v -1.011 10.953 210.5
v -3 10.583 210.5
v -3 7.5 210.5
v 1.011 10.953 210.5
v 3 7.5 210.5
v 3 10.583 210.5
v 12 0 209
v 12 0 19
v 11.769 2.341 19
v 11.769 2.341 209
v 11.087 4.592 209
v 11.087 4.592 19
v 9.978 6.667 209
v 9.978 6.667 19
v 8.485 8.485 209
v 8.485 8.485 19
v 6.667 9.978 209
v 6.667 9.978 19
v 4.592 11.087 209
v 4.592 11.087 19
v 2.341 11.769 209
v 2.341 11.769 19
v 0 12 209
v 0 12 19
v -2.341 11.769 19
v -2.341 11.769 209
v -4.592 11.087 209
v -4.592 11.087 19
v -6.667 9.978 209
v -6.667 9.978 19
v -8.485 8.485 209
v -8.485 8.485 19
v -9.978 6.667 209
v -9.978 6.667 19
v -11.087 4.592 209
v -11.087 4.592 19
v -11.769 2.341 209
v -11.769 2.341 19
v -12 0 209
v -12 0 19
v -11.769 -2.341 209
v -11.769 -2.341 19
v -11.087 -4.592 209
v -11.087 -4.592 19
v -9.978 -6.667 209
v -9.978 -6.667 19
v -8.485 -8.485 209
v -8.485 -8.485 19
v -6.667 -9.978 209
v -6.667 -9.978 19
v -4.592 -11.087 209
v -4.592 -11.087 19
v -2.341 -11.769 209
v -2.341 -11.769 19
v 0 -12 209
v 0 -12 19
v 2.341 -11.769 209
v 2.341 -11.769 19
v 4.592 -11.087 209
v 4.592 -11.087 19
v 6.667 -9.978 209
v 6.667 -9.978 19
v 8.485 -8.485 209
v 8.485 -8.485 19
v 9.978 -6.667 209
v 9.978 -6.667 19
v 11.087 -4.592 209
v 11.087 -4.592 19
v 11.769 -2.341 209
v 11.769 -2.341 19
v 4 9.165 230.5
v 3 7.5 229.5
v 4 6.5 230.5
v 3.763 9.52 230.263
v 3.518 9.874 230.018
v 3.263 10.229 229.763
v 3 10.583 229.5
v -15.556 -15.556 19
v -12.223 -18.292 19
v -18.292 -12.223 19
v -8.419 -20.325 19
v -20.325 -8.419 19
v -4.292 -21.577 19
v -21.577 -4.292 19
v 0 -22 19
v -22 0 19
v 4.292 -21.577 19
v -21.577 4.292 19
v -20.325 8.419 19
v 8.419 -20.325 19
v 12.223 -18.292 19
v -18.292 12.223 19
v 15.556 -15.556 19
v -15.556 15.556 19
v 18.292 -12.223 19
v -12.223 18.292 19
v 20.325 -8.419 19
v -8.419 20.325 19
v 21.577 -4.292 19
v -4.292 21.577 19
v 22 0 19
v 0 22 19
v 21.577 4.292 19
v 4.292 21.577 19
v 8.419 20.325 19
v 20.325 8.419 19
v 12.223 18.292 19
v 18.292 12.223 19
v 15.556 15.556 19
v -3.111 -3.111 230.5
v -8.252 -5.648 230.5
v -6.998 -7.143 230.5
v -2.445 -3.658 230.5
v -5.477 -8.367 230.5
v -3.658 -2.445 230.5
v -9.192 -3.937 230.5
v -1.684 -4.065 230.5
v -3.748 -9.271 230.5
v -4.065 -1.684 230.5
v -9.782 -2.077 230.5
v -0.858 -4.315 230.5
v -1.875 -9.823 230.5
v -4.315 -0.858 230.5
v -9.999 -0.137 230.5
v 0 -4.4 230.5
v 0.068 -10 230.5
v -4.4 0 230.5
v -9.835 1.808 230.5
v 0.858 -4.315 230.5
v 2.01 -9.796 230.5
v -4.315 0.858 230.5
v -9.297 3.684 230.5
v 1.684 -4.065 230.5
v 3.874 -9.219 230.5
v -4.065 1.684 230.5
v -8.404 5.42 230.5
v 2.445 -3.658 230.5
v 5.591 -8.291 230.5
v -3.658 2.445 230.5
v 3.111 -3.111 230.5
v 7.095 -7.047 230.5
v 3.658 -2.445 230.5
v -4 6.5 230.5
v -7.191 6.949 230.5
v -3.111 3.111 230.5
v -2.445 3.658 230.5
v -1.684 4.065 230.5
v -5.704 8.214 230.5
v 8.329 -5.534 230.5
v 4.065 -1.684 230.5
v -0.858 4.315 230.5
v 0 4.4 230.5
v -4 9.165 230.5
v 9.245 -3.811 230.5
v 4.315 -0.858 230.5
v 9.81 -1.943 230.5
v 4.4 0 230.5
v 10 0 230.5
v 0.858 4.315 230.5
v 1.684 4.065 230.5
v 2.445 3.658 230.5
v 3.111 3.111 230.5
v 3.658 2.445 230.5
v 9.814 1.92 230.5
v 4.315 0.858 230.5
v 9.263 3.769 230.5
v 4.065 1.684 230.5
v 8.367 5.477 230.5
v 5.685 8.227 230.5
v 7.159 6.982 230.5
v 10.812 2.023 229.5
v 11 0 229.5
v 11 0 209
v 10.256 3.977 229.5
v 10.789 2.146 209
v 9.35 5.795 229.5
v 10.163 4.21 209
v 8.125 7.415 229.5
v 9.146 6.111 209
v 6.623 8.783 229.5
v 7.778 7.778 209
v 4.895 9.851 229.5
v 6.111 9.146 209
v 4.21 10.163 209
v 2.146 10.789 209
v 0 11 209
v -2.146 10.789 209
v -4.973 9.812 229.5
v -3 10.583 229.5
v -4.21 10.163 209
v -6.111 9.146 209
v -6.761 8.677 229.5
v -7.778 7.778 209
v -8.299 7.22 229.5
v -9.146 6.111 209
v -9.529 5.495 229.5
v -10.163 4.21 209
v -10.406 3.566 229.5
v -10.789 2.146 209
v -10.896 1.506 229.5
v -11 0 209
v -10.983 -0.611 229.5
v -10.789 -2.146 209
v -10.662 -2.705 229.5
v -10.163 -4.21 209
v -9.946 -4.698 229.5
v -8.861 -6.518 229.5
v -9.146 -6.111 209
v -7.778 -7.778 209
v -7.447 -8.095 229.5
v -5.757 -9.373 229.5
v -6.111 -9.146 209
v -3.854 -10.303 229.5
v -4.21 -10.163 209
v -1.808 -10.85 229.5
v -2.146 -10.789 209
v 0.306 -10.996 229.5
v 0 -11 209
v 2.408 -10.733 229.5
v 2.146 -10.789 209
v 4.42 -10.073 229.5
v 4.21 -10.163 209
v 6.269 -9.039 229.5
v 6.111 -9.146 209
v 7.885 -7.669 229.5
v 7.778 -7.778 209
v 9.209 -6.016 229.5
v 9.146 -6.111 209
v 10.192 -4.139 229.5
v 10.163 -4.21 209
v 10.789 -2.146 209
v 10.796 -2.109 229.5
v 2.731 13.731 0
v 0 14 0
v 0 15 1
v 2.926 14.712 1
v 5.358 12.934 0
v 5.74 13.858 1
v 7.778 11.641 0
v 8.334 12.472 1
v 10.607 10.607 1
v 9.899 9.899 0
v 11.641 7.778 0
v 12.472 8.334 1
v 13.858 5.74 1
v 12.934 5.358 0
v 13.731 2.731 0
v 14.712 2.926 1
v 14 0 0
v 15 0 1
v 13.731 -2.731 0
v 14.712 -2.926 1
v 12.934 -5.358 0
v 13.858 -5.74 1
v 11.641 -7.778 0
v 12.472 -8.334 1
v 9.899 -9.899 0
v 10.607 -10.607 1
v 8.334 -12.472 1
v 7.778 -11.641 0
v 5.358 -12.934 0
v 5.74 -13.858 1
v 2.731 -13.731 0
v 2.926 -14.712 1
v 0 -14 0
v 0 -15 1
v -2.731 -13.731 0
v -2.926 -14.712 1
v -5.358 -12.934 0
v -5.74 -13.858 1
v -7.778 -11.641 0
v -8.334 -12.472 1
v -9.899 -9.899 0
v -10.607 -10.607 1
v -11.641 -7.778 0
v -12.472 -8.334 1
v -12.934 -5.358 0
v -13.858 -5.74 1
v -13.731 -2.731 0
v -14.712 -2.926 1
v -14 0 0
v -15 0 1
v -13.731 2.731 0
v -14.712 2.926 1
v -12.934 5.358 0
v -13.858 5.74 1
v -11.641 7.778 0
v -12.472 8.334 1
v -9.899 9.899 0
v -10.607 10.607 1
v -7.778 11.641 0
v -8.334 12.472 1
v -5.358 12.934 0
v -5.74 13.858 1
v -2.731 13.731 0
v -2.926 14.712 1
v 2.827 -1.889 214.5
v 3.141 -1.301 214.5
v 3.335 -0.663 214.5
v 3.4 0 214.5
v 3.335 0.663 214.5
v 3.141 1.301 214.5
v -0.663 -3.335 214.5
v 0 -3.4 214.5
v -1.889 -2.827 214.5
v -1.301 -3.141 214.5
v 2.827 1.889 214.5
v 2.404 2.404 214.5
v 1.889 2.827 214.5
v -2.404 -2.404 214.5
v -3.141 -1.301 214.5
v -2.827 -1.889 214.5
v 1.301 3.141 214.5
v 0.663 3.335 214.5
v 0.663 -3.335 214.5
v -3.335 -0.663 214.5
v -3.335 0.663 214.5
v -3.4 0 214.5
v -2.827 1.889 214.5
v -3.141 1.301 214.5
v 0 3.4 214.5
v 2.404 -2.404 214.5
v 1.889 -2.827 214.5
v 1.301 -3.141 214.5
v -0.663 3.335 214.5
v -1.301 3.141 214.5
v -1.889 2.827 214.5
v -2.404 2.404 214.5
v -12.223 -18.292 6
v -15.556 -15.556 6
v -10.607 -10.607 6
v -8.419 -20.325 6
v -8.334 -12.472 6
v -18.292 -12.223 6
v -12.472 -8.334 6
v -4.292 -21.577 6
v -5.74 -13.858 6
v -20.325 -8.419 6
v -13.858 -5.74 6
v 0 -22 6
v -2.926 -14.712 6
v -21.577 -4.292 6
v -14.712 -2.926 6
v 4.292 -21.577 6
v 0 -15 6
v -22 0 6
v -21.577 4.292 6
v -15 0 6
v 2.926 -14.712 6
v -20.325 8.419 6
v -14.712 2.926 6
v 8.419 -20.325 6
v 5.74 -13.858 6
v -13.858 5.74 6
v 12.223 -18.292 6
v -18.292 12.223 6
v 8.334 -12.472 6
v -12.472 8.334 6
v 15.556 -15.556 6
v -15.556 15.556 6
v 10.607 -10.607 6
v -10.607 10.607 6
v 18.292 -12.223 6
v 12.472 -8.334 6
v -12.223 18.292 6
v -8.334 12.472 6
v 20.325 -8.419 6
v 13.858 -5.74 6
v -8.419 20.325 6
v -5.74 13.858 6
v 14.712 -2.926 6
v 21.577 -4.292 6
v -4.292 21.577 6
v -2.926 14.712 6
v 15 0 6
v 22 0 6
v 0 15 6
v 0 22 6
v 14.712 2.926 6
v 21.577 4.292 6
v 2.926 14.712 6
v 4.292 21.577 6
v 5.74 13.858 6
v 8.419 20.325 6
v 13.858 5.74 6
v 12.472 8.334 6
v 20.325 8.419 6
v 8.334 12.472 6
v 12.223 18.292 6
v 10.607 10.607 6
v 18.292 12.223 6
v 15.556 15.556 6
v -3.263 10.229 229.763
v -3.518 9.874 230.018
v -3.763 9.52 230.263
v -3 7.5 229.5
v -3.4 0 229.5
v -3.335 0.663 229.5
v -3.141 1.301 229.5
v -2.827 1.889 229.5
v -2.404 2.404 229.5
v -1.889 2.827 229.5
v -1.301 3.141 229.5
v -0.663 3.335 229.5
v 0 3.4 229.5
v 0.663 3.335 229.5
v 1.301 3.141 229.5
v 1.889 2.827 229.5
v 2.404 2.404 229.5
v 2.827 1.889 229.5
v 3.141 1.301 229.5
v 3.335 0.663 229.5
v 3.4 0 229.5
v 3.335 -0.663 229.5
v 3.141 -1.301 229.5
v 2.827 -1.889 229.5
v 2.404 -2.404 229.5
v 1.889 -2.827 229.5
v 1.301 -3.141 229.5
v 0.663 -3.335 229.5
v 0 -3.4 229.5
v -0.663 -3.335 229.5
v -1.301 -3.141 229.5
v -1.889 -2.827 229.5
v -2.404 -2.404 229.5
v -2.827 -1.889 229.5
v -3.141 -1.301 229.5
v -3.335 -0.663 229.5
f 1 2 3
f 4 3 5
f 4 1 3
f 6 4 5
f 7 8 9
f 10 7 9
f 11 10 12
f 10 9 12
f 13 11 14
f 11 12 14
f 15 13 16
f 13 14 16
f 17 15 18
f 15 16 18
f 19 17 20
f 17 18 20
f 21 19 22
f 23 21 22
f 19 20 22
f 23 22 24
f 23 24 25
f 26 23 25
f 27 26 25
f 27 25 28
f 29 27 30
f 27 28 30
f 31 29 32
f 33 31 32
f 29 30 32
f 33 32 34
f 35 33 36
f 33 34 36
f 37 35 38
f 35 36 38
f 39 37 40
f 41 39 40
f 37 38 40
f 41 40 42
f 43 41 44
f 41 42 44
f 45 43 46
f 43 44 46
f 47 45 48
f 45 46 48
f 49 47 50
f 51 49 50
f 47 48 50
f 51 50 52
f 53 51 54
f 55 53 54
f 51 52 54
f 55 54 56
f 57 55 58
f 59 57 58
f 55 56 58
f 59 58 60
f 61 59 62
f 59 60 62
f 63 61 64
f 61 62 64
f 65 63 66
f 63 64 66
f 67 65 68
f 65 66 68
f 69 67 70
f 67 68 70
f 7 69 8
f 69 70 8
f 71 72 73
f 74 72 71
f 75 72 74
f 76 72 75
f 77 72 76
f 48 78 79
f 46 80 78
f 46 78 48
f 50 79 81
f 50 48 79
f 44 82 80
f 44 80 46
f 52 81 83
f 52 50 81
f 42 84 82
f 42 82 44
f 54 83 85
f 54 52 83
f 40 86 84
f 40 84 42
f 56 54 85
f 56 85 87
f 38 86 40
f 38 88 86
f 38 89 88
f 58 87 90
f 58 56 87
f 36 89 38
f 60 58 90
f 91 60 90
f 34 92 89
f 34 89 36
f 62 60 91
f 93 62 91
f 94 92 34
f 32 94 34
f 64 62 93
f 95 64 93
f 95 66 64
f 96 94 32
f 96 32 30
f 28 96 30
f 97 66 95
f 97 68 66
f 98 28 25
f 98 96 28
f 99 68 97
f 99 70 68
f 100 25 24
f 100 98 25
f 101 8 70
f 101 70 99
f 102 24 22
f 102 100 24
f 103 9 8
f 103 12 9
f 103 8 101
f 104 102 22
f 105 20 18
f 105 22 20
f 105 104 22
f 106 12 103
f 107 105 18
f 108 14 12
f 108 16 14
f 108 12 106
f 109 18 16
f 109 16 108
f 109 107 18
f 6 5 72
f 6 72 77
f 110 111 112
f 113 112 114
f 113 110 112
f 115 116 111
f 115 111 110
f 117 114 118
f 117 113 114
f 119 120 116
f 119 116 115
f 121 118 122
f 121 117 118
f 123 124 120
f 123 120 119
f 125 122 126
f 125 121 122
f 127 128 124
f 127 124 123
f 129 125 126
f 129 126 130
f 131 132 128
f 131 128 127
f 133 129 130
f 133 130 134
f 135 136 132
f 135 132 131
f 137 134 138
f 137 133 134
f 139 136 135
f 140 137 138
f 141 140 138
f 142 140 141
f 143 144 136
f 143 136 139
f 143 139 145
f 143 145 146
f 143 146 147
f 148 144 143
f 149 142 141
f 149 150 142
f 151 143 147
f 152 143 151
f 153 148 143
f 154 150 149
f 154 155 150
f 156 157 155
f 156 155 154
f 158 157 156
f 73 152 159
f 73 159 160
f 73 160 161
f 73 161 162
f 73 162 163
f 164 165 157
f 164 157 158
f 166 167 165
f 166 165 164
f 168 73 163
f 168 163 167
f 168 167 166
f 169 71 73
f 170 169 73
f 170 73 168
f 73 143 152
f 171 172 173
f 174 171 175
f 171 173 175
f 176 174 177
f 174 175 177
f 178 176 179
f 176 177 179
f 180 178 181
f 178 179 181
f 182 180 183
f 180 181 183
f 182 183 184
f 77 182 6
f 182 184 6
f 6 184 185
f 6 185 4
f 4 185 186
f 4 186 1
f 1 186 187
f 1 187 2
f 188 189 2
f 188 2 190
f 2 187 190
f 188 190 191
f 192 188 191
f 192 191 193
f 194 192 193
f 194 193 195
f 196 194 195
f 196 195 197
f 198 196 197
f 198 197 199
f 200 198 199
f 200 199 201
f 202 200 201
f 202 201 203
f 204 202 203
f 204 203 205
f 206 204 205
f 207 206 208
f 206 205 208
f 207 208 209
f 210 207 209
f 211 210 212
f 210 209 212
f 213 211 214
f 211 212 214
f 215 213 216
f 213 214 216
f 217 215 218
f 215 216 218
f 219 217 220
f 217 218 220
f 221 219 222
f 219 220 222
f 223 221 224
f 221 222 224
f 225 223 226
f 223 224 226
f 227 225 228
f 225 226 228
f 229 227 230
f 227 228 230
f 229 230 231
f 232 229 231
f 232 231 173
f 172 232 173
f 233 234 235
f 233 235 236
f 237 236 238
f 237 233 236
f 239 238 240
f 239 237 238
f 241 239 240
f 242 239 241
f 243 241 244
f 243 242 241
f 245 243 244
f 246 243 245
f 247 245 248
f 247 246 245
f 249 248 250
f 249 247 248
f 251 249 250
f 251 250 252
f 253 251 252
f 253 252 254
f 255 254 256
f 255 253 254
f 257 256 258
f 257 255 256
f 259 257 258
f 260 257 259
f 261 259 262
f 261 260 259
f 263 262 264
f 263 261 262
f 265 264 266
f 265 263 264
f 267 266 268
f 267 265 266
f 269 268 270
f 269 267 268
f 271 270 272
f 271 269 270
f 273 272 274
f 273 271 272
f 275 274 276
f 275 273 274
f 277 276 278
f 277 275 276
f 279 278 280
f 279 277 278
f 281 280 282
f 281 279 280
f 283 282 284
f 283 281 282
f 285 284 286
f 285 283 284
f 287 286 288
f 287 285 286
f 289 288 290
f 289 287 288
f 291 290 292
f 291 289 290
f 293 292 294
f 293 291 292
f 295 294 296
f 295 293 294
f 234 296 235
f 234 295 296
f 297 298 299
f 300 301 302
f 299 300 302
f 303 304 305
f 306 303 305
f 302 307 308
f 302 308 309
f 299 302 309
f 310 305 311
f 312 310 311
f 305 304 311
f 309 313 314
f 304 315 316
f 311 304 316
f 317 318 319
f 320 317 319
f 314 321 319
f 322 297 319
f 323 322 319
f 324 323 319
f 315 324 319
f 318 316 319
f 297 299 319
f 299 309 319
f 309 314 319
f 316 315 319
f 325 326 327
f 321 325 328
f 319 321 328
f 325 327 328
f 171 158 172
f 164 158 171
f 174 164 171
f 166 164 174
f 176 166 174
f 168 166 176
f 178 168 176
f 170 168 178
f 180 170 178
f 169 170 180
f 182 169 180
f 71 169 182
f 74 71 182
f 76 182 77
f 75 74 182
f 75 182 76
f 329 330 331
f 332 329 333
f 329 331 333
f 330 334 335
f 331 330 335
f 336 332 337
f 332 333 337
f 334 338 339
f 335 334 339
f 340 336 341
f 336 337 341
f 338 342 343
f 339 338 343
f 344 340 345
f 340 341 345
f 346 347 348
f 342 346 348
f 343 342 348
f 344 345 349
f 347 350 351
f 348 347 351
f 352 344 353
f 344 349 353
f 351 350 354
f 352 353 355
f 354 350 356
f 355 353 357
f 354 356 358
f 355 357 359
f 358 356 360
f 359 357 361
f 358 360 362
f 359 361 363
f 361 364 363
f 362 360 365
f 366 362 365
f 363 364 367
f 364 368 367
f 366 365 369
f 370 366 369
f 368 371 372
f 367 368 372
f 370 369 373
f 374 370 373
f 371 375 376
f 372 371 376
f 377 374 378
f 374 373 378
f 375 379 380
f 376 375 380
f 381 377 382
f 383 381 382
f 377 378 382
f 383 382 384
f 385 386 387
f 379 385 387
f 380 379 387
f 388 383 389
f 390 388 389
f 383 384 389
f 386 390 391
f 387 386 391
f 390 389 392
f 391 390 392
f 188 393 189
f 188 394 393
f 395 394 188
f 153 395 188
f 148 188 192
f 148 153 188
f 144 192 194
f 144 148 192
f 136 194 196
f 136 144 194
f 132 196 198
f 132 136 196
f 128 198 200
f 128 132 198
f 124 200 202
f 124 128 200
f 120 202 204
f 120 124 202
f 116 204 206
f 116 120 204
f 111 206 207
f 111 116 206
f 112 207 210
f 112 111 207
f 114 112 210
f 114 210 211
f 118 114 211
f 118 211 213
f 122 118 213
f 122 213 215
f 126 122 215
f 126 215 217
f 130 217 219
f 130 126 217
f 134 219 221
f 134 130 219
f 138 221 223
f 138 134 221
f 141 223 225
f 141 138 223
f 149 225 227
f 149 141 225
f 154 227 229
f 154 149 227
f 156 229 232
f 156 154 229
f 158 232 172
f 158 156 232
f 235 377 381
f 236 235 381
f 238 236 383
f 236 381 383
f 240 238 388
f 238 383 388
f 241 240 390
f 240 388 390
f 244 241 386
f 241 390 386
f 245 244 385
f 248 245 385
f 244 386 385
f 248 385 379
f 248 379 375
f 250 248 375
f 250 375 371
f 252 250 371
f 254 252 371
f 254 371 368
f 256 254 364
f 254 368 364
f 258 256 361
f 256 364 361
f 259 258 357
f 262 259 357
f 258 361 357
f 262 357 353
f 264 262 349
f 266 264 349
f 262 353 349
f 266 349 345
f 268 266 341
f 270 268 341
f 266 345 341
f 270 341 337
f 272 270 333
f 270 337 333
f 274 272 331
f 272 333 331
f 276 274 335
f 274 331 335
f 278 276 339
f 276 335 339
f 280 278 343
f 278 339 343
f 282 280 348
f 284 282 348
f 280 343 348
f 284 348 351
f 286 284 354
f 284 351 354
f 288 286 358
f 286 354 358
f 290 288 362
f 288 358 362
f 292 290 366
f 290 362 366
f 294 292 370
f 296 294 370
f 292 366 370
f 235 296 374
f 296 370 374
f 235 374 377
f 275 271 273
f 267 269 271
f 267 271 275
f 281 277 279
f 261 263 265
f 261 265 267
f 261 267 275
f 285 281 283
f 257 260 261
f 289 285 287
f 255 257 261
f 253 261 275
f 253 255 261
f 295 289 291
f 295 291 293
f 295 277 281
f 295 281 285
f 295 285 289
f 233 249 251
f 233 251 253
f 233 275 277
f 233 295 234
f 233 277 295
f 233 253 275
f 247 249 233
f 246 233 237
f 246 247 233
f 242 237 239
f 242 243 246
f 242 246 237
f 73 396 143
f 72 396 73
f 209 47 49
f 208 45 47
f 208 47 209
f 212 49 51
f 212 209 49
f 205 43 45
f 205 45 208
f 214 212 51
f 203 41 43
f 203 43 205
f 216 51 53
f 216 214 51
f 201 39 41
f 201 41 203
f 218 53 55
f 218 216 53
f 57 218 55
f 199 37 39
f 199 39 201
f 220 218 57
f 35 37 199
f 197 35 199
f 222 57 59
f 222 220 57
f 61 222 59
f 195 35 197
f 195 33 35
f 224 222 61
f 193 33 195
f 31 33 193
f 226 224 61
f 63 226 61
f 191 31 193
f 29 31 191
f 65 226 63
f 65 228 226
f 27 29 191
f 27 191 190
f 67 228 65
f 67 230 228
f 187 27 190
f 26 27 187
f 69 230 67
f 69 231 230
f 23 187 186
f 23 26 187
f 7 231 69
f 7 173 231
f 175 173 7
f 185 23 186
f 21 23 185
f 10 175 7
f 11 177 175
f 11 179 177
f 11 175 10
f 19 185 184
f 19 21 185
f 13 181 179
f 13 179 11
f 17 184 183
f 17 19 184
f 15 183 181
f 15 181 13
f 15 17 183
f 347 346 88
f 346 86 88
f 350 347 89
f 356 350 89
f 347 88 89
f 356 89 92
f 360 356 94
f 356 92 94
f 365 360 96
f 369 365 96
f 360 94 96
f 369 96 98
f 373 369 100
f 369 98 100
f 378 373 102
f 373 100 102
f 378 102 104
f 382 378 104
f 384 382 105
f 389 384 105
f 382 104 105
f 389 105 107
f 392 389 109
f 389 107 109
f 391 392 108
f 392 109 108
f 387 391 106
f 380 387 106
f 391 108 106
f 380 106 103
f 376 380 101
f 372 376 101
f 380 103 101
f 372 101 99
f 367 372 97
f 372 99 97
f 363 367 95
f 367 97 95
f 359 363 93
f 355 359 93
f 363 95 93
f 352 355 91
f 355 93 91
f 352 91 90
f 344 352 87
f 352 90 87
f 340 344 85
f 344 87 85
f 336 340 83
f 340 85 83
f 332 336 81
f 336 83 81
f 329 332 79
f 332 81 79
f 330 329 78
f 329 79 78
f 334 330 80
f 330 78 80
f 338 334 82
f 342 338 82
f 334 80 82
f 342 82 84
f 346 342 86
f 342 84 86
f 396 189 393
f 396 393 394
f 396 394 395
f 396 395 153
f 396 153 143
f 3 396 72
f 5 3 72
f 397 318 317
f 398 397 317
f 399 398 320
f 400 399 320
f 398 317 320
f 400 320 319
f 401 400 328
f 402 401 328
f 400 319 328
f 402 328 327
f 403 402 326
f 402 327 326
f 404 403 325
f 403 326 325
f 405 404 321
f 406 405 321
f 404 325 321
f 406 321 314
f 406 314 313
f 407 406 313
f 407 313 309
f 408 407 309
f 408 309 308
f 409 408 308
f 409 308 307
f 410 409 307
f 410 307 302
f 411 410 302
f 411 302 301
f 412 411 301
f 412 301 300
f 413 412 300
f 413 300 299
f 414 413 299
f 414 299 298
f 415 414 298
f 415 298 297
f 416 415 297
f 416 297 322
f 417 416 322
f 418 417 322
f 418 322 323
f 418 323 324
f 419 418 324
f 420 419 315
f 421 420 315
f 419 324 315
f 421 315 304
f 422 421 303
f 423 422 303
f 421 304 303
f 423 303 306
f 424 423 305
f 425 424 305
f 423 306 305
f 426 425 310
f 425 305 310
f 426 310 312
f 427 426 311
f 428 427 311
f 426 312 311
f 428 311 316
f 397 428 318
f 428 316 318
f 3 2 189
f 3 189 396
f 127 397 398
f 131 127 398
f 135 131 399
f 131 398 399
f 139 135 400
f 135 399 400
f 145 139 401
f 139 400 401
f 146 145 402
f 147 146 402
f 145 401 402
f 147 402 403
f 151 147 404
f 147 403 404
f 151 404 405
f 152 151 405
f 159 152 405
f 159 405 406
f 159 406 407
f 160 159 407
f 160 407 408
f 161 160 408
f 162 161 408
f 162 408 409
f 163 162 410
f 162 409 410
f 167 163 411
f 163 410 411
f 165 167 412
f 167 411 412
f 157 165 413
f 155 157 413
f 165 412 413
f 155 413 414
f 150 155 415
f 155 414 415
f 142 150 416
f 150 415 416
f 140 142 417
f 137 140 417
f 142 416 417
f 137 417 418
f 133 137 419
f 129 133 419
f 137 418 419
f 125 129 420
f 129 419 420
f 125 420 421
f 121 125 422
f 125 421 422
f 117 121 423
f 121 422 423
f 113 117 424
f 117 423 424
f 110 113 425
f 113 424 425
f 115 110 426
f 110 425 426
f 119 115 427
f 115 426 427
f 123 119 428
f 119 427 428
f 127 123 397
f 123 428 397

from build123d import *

# Parameters (mm, degrees)
SKETCH1_W                      = 22
SKETCH1_H                      = 13
SKETCH2_R                      = 12
BOSS_EXTRUDE1_DEPTH            = 190
SKETCH3_R                      = 11
BOSS_EXTRUDE2_DEPTH            = 21.5
CUT_EXTRUDE1_START             = -20
CUT_EXTRUDE1_DEPTH             = 20
SKETCH5_R                      = 15
BOSS_EXTRUDE3_DEPTH            = 6
F_6_8_6_8_DIAMETER_HOLE1_D     = 6.8
F_6_8_6_8_DIAMETER_HOLE1_DEPTH = 16
CHAMFER1_SIZE                  = 1


with BuildPart() as part:
    # Sketch1 → Revolve1 (revolve)
    with BuildSketch(Plane.XZ, mode=Mode.PRIVATE) as revolve1_sk:
        with Locations((11, 12.5)):
            Rectangle(SKETCH1_W, SKETCH1_H)
    revolve(revolve1_sk.sketch.rotate(Axis((0, 0, 19), (0, 0, -1)), 180), axis=Axis((0, 0, 19), (0, 0, -1)))

    # Sketch2 → Boss-Extrude1 (add)
    with BuildSketch(Plane.XY.offset(19)):
        Circle(SKETCH2_R)
    extrude(amount=BOSS_EXTRUDE1_DEPTH)

    # Sketch3 → Boss-Extrude2 (add)
    with BuildSketch(Plane.XY.offset(209)):
        Circle(SKETCH3_R)
    extrude(amount=BOSS_EXTRUDE2_DEPTH)

    # Sketch4 → Cut-Extrude1 (cut)
    with BuildSketch(Plane.XY.offset(230.5).offset(CUT_EXTRUDE1_START)):
        with BuildLine():
            Line((3, 7.5), (3, 10.583005244))
            ThreePointArc((3, 10.583005244), (0, 11), (-3, 10.583005244))
            Line((-3, 10.583005244), (-3, 7.5))
            Line((-3, 7.5), (3, 7.5))
        make_face()
    extrude(amount=CUT_EXTRUDE1_DEPTH, mode=Mode.SUBTRACT)

    # Sketch5 → Boss-Extrude3 (add)
    with BuildSketch(Plane(origin=(0, 0, 6), x_dir=(-1, 0, 0), z_dir=(0, 0, -1))):
        with Locations(Location((0, 0, 0), (0, 0, 90))):
            Circle(SKETCH5_R)
    extrude(amount=BOSS_EXTRUDE3_DEPTH)

    # Ø6.8 (6.8) Diameter Hole1
    with Locations(Plane.XY.offset(230.5)):
        with Locations((0, 0)):
            Hole(F_6_8_6_8_DIAMETER_HOLE1_D / 2, depth=F_6_8_6_8_DIAMETER_HOLE1_DEPTH)

    # Chamfer1
    chamfer1_edges = [part.edges().sort_by_distance(p)[0] for p in [
        (-6.633249581, -8.774964387, 230.5),
        (0, 7.5, 230.5),
        (3, 9.041502622, 230.5),
        (-3, 9.041502622, 230.5),
        (0, -15, 0),
        (3.4, 0, 230.5),
    ]]
    chamfer(chamfer1_edges, length=CHAMFER1_SIZE)


solid = part.part
